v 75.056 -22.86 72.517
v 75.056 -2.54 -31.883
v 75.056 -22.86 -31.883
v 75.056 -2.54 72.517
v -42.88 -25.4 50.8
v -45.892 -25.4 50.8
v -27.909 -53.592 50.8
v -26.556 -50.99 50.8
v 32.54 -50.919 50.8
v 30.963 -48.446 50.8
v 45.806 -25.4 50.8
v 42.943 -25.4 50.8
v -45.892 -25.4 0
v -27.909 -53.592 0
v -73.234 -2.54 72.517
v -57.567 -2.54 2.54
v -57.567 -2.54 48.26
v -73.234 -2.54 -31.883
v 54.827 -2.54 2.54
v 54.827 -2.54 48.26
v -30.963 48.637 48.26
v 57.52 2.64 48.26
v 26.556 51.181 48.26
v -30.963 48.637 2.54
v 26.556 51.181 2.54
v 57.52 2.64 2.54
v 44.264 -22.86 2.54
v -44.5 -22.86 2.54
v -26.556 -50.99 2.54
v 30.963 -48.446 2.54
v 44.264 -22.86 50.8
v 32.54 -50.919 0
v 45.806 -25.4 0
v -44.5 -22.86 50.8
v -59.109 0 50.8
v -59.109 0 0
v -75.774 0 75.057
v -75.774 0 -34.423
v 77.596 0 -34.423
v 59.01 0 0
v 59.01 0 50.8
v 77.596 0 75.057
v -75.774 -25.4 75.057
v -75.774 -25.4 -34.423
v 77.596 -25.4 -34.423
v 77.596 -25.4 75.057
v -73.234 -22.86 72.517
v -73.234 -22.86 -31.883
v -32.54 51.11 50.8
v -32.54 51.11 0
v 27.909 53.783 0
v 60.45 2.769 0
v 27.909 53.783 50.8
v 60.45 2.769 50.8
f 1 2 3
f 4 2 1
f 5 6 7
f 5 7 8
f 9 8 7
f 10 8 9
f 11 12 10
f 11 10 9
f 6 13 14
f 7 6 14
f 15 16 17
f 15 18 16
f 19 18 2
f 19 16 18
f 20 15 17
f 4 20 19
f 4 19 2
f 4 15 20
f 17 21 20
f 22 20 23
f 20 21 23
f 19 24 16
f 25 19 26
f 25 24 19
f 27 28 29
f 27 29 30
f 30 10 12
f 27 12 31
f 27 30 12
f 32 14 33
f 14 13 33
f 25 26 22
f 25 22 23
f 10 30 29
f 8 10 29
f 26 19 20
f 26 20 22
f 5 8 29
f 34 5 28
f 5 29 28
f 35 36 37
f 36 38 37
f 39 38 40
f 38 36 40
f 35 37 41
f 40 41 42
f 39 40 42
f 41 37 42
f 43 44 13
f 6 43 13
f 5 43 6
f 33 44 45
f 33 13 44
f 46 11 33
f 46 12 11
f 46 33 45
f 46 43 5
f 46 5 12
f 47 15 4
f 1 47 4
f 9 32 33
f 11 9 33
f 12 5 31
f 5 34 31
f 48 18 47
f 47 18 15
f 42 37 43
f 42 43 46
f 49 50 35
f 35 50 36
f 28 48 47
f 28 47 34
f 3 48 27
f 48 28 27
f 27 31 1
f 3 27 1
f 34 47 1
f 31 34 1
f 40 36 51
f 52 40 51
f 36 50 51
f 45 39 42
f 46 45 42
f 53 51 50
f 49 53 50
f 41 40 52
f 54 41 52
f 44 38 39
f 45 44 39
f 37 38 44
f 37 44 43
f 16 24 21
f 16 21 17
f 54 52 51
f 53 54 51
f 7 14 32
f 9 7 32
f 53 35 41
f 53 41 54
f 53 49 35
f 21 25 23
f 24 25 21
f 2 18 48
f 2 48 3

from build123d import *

# Parameters (mm, degrees)
F1_DEPTH = 50.8
F2_W     = 153.3701941371
F2_H     = 109.4799749553
F3_DEPTH = 25.4
F4_T     = -2.54


# Not quite as in the source:
# - a shell that OpenCascade refuses in one call is made with other operations: the cavity is built on its own and cut out


with BuildPart() as f1:
    # F0 (on Top) → F1 (new body)
    with BuildSketch(Plane.XY):
        Polygon((32.5404184413, -50.9185224387), (60.4496595907, 2.769324145), (27.9092411494, 53.7833592726), (-32.5404184413, 51.1095478164), (-60.4496595907, -2.5782987673), (-27.9092411494, -53.5923338949), align=None)
    extrude(amount=F1_DEPTH)

    # F2 (on Front) → F3 (join)
    with BuildSketch(Plane.XZ):
        with Locations((0.9111128747, 20.3165654093)):
            Rectangle(F2_W, F2_H)
    extrude(amount=F3_DEPTH)

    # F4: a shell. OpenCascade refuses it in one call, so the cavity is built on its own and cut out:
    # the body offset inwards by the wall thickness, plus a prism from it out through each open face.
    f4_core = offset(f1.part, amount=F4_T, kind=Kind.INTERSECTION, mode=Mode.PRIVATE)
    f4_exits = [f4_core.faces().sort_by_distance(p)[0] for p in [
        (0.261081, -35.353201, 48.26),
    ]]
    add(f4_core, mode=Mode.SUBTRACT)
    extrude(f4_exits, amount=-F4_T, mode=Mode.SUBTRACT)


solid = f1.part
